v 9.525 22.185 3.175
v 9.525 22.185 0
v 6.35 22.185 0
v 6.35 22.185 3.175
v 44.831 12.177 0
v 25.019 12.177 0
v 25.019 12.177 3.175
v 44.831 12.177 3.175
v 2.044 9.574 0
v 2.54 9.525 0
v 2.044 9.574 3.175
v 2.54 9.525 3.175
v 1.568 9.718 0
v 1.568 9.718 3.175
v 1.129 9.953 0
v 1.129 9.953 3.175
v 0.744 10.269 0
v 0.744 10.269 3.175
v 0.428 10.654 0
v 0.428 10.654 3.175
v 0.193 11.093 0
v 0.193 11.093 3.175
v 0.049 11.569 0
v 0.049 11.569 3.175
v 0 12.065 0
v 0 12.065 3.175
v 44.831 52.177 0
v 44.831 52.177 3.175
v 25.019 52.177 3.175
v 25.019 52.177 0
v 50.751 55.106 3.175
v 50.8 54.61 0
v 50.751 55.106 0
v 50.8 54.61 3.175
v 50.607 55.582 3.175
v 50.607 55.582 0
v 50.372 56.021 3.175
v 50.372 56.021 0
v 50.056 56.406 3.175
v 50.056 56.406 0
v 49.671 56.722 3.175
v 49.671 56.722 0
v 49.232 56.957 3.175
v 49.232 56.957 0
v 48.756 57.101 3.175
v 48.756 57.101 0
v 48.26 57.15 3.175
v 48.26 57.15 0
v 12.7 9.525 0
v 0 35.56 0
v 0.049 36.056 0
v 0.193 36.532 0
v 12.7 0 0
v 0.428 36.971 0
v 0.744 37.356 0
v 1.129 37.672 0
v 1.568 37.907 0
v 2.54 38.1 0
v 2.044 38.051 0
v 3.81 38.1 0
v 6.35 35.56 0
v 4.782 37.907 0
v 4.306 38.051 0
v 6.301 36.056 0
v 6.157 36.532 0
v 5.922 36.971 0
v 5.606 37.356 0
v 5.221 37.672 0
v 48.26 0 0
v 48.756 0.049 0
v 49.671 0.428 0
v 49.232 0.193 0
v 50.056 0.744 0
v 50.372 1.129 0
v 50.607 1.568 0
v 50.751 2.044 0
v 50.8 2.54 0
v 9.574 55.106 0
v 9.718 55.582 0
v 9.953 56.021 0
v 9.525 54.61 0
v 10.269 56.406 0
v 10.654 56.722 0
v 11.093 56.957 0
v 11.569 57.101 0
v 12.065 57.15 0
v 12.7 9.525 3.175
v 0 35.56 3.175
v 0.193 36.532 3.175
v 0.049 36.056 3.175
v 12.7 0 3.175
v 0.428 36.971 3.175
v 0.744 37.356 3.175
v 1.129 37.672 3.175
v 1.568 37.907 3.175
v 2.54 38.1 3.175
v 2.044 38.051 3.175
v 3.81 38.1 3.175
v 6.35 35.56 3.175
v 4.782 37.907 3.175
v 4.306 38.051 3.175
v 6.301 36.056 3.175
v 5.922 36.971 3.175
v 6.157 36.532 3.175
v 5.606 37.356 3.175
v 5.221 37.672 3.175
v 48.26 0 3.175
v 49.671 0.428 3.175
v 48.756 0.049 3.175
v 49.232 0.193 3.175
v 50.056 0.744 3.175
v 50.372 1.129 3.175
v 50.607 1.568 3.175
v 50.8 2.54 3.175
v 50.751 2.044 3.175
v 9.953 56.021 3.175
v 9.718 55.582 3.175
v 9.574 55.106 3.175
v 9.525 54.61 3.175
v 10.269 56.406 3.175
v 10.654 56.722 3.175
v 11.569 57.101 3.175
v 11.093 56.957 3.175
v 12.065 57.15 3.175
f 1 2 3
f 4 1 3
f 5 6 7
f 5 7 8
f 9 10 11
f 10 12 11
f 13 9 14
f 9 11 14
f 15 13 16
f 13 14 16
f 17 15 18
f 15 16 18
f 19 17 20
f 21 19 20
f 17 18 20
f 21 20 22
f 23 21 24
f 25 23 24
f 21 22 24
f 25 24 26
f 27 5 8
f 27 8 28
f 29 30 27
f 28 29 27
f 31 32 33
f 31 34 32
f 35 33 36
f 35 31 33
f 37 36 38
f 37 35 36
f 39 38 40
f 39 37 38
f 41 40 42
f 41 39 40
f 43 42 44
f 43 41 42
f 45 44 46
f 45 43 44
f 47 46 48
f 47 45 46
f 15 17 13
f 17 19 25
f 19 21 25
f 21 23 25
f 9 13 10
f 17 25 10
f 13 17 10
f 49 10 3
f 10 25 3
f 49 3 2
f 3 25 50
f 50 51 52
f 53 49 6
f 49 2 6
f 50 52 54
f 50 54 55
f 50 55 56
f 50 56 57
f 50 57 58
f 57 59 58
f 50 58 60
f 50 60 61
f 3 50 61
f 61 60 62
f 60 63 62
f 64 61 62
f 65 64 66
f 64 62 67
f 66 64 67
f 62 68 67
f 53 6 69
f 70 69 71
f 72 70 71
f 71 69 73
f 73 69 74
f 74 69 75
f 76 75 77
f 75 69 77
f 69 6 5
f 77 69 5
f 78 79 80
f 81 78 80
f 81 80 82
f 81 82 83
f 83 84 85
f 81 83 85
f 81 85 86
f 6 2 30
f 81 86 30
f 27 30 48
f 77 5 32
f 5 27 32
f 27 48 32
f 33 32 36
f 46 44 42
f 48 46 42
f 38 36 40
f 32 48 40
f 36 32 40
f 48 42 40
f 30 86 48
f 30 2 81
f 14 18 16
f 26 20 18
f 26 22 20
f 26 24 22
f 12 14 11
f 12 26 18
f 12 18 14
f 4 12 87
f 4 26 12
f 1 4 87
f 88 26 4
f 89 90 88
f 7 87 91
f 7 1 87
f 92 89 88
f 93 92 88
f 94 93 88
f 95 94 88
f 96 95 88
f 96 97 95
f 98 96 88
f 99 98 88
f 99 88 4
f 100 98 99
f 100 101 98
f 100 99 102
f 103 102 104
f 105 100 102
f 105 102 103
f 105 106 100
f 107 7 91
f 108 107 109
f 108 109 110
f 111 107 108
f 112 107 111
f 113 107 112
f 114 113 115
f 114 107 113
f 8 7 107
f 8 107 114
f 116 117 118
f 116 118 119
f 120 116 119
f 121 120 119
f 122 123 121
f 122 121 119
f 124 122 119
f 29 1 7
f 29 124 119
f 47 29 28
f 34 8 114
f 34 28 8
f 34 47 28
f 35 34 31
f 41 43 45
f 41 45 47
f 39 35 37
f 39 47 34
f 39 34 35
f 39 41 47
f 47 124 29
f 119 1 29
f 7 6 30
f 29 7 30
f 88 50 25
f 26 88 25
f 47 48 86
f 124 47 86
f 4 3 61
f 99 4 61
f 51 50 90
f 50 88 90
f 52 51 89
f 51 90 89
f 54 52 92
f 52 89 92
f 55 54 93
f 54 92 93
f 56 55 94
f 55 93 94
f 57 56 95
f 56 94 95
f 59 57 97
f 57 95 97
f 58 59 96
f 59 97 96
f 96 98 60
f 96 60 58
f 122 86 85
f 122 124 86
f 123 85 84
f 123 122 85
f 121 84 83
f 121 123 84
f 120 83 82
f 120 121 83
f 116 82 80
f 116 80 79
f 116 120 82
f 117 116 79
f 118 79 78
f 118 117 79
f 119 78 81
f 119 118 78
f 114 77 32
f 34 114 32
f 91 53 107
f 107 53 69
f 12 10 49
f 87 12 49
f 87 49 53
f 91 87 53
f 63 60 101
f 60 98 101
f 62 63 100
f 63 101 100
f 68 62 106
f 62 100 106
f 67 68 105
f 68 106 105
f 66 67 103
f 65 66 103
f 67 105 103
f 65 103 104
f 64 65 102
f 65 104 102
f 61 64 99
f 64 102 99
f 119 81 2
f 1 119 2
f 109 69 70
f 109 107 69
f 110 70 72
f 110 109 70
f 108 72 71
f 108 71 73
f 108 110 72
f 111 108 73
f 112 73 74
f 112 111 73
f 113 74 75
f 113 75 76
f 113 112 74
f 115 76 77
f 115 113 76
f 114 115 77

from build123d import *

# Parameters (mm, degrees)
SKETCH1_W           = 19.812
SKETCH1_H           = 40
BOSS_EXTRUDE1_DEPTH = 3.175
FILLET2_R           = 2.54


with BuildPart() as part:
    # Sketch1 → Boss-Extrude1 (new body)
    with BuildSketch(Plane.XY):
        Polygon((12.7, 0), (50.8, 0), (50.8, 38.1), (50.8, 57.15), (9.525, 57.15), (9.525, 38.1), (9.525, 22.184785263), (6.35, 22.184785263), (6.35, 38.1), (0, 38.1), (0, 9.525), (12.7, 9.525), align=None)
        with Locations((34.925, 32.177185263)):
            Rectangle(SKETCH1_W, SKETCH1_H, mode=Mode.SUBTRACT)
    extrude(amount=BOSS_EXTRUDE1_DEPTH)

    # Fillet2
    fillet2_edges = [part.edges().sort_by_distance(p)[0] for p in [
        (50.8, 0, 1.5875),
        (0, 9.525, 1.5875),
        (0, 38.1, 1.5875),
        (6.35, 38.1, 1.5875),
        (9.525, 57.15, 1.5875),
        (50.8, 57.15, 1.5875),
    ]]
    fillet(fillet2_edges, radius=FILLET2_R)


solid = part.part
